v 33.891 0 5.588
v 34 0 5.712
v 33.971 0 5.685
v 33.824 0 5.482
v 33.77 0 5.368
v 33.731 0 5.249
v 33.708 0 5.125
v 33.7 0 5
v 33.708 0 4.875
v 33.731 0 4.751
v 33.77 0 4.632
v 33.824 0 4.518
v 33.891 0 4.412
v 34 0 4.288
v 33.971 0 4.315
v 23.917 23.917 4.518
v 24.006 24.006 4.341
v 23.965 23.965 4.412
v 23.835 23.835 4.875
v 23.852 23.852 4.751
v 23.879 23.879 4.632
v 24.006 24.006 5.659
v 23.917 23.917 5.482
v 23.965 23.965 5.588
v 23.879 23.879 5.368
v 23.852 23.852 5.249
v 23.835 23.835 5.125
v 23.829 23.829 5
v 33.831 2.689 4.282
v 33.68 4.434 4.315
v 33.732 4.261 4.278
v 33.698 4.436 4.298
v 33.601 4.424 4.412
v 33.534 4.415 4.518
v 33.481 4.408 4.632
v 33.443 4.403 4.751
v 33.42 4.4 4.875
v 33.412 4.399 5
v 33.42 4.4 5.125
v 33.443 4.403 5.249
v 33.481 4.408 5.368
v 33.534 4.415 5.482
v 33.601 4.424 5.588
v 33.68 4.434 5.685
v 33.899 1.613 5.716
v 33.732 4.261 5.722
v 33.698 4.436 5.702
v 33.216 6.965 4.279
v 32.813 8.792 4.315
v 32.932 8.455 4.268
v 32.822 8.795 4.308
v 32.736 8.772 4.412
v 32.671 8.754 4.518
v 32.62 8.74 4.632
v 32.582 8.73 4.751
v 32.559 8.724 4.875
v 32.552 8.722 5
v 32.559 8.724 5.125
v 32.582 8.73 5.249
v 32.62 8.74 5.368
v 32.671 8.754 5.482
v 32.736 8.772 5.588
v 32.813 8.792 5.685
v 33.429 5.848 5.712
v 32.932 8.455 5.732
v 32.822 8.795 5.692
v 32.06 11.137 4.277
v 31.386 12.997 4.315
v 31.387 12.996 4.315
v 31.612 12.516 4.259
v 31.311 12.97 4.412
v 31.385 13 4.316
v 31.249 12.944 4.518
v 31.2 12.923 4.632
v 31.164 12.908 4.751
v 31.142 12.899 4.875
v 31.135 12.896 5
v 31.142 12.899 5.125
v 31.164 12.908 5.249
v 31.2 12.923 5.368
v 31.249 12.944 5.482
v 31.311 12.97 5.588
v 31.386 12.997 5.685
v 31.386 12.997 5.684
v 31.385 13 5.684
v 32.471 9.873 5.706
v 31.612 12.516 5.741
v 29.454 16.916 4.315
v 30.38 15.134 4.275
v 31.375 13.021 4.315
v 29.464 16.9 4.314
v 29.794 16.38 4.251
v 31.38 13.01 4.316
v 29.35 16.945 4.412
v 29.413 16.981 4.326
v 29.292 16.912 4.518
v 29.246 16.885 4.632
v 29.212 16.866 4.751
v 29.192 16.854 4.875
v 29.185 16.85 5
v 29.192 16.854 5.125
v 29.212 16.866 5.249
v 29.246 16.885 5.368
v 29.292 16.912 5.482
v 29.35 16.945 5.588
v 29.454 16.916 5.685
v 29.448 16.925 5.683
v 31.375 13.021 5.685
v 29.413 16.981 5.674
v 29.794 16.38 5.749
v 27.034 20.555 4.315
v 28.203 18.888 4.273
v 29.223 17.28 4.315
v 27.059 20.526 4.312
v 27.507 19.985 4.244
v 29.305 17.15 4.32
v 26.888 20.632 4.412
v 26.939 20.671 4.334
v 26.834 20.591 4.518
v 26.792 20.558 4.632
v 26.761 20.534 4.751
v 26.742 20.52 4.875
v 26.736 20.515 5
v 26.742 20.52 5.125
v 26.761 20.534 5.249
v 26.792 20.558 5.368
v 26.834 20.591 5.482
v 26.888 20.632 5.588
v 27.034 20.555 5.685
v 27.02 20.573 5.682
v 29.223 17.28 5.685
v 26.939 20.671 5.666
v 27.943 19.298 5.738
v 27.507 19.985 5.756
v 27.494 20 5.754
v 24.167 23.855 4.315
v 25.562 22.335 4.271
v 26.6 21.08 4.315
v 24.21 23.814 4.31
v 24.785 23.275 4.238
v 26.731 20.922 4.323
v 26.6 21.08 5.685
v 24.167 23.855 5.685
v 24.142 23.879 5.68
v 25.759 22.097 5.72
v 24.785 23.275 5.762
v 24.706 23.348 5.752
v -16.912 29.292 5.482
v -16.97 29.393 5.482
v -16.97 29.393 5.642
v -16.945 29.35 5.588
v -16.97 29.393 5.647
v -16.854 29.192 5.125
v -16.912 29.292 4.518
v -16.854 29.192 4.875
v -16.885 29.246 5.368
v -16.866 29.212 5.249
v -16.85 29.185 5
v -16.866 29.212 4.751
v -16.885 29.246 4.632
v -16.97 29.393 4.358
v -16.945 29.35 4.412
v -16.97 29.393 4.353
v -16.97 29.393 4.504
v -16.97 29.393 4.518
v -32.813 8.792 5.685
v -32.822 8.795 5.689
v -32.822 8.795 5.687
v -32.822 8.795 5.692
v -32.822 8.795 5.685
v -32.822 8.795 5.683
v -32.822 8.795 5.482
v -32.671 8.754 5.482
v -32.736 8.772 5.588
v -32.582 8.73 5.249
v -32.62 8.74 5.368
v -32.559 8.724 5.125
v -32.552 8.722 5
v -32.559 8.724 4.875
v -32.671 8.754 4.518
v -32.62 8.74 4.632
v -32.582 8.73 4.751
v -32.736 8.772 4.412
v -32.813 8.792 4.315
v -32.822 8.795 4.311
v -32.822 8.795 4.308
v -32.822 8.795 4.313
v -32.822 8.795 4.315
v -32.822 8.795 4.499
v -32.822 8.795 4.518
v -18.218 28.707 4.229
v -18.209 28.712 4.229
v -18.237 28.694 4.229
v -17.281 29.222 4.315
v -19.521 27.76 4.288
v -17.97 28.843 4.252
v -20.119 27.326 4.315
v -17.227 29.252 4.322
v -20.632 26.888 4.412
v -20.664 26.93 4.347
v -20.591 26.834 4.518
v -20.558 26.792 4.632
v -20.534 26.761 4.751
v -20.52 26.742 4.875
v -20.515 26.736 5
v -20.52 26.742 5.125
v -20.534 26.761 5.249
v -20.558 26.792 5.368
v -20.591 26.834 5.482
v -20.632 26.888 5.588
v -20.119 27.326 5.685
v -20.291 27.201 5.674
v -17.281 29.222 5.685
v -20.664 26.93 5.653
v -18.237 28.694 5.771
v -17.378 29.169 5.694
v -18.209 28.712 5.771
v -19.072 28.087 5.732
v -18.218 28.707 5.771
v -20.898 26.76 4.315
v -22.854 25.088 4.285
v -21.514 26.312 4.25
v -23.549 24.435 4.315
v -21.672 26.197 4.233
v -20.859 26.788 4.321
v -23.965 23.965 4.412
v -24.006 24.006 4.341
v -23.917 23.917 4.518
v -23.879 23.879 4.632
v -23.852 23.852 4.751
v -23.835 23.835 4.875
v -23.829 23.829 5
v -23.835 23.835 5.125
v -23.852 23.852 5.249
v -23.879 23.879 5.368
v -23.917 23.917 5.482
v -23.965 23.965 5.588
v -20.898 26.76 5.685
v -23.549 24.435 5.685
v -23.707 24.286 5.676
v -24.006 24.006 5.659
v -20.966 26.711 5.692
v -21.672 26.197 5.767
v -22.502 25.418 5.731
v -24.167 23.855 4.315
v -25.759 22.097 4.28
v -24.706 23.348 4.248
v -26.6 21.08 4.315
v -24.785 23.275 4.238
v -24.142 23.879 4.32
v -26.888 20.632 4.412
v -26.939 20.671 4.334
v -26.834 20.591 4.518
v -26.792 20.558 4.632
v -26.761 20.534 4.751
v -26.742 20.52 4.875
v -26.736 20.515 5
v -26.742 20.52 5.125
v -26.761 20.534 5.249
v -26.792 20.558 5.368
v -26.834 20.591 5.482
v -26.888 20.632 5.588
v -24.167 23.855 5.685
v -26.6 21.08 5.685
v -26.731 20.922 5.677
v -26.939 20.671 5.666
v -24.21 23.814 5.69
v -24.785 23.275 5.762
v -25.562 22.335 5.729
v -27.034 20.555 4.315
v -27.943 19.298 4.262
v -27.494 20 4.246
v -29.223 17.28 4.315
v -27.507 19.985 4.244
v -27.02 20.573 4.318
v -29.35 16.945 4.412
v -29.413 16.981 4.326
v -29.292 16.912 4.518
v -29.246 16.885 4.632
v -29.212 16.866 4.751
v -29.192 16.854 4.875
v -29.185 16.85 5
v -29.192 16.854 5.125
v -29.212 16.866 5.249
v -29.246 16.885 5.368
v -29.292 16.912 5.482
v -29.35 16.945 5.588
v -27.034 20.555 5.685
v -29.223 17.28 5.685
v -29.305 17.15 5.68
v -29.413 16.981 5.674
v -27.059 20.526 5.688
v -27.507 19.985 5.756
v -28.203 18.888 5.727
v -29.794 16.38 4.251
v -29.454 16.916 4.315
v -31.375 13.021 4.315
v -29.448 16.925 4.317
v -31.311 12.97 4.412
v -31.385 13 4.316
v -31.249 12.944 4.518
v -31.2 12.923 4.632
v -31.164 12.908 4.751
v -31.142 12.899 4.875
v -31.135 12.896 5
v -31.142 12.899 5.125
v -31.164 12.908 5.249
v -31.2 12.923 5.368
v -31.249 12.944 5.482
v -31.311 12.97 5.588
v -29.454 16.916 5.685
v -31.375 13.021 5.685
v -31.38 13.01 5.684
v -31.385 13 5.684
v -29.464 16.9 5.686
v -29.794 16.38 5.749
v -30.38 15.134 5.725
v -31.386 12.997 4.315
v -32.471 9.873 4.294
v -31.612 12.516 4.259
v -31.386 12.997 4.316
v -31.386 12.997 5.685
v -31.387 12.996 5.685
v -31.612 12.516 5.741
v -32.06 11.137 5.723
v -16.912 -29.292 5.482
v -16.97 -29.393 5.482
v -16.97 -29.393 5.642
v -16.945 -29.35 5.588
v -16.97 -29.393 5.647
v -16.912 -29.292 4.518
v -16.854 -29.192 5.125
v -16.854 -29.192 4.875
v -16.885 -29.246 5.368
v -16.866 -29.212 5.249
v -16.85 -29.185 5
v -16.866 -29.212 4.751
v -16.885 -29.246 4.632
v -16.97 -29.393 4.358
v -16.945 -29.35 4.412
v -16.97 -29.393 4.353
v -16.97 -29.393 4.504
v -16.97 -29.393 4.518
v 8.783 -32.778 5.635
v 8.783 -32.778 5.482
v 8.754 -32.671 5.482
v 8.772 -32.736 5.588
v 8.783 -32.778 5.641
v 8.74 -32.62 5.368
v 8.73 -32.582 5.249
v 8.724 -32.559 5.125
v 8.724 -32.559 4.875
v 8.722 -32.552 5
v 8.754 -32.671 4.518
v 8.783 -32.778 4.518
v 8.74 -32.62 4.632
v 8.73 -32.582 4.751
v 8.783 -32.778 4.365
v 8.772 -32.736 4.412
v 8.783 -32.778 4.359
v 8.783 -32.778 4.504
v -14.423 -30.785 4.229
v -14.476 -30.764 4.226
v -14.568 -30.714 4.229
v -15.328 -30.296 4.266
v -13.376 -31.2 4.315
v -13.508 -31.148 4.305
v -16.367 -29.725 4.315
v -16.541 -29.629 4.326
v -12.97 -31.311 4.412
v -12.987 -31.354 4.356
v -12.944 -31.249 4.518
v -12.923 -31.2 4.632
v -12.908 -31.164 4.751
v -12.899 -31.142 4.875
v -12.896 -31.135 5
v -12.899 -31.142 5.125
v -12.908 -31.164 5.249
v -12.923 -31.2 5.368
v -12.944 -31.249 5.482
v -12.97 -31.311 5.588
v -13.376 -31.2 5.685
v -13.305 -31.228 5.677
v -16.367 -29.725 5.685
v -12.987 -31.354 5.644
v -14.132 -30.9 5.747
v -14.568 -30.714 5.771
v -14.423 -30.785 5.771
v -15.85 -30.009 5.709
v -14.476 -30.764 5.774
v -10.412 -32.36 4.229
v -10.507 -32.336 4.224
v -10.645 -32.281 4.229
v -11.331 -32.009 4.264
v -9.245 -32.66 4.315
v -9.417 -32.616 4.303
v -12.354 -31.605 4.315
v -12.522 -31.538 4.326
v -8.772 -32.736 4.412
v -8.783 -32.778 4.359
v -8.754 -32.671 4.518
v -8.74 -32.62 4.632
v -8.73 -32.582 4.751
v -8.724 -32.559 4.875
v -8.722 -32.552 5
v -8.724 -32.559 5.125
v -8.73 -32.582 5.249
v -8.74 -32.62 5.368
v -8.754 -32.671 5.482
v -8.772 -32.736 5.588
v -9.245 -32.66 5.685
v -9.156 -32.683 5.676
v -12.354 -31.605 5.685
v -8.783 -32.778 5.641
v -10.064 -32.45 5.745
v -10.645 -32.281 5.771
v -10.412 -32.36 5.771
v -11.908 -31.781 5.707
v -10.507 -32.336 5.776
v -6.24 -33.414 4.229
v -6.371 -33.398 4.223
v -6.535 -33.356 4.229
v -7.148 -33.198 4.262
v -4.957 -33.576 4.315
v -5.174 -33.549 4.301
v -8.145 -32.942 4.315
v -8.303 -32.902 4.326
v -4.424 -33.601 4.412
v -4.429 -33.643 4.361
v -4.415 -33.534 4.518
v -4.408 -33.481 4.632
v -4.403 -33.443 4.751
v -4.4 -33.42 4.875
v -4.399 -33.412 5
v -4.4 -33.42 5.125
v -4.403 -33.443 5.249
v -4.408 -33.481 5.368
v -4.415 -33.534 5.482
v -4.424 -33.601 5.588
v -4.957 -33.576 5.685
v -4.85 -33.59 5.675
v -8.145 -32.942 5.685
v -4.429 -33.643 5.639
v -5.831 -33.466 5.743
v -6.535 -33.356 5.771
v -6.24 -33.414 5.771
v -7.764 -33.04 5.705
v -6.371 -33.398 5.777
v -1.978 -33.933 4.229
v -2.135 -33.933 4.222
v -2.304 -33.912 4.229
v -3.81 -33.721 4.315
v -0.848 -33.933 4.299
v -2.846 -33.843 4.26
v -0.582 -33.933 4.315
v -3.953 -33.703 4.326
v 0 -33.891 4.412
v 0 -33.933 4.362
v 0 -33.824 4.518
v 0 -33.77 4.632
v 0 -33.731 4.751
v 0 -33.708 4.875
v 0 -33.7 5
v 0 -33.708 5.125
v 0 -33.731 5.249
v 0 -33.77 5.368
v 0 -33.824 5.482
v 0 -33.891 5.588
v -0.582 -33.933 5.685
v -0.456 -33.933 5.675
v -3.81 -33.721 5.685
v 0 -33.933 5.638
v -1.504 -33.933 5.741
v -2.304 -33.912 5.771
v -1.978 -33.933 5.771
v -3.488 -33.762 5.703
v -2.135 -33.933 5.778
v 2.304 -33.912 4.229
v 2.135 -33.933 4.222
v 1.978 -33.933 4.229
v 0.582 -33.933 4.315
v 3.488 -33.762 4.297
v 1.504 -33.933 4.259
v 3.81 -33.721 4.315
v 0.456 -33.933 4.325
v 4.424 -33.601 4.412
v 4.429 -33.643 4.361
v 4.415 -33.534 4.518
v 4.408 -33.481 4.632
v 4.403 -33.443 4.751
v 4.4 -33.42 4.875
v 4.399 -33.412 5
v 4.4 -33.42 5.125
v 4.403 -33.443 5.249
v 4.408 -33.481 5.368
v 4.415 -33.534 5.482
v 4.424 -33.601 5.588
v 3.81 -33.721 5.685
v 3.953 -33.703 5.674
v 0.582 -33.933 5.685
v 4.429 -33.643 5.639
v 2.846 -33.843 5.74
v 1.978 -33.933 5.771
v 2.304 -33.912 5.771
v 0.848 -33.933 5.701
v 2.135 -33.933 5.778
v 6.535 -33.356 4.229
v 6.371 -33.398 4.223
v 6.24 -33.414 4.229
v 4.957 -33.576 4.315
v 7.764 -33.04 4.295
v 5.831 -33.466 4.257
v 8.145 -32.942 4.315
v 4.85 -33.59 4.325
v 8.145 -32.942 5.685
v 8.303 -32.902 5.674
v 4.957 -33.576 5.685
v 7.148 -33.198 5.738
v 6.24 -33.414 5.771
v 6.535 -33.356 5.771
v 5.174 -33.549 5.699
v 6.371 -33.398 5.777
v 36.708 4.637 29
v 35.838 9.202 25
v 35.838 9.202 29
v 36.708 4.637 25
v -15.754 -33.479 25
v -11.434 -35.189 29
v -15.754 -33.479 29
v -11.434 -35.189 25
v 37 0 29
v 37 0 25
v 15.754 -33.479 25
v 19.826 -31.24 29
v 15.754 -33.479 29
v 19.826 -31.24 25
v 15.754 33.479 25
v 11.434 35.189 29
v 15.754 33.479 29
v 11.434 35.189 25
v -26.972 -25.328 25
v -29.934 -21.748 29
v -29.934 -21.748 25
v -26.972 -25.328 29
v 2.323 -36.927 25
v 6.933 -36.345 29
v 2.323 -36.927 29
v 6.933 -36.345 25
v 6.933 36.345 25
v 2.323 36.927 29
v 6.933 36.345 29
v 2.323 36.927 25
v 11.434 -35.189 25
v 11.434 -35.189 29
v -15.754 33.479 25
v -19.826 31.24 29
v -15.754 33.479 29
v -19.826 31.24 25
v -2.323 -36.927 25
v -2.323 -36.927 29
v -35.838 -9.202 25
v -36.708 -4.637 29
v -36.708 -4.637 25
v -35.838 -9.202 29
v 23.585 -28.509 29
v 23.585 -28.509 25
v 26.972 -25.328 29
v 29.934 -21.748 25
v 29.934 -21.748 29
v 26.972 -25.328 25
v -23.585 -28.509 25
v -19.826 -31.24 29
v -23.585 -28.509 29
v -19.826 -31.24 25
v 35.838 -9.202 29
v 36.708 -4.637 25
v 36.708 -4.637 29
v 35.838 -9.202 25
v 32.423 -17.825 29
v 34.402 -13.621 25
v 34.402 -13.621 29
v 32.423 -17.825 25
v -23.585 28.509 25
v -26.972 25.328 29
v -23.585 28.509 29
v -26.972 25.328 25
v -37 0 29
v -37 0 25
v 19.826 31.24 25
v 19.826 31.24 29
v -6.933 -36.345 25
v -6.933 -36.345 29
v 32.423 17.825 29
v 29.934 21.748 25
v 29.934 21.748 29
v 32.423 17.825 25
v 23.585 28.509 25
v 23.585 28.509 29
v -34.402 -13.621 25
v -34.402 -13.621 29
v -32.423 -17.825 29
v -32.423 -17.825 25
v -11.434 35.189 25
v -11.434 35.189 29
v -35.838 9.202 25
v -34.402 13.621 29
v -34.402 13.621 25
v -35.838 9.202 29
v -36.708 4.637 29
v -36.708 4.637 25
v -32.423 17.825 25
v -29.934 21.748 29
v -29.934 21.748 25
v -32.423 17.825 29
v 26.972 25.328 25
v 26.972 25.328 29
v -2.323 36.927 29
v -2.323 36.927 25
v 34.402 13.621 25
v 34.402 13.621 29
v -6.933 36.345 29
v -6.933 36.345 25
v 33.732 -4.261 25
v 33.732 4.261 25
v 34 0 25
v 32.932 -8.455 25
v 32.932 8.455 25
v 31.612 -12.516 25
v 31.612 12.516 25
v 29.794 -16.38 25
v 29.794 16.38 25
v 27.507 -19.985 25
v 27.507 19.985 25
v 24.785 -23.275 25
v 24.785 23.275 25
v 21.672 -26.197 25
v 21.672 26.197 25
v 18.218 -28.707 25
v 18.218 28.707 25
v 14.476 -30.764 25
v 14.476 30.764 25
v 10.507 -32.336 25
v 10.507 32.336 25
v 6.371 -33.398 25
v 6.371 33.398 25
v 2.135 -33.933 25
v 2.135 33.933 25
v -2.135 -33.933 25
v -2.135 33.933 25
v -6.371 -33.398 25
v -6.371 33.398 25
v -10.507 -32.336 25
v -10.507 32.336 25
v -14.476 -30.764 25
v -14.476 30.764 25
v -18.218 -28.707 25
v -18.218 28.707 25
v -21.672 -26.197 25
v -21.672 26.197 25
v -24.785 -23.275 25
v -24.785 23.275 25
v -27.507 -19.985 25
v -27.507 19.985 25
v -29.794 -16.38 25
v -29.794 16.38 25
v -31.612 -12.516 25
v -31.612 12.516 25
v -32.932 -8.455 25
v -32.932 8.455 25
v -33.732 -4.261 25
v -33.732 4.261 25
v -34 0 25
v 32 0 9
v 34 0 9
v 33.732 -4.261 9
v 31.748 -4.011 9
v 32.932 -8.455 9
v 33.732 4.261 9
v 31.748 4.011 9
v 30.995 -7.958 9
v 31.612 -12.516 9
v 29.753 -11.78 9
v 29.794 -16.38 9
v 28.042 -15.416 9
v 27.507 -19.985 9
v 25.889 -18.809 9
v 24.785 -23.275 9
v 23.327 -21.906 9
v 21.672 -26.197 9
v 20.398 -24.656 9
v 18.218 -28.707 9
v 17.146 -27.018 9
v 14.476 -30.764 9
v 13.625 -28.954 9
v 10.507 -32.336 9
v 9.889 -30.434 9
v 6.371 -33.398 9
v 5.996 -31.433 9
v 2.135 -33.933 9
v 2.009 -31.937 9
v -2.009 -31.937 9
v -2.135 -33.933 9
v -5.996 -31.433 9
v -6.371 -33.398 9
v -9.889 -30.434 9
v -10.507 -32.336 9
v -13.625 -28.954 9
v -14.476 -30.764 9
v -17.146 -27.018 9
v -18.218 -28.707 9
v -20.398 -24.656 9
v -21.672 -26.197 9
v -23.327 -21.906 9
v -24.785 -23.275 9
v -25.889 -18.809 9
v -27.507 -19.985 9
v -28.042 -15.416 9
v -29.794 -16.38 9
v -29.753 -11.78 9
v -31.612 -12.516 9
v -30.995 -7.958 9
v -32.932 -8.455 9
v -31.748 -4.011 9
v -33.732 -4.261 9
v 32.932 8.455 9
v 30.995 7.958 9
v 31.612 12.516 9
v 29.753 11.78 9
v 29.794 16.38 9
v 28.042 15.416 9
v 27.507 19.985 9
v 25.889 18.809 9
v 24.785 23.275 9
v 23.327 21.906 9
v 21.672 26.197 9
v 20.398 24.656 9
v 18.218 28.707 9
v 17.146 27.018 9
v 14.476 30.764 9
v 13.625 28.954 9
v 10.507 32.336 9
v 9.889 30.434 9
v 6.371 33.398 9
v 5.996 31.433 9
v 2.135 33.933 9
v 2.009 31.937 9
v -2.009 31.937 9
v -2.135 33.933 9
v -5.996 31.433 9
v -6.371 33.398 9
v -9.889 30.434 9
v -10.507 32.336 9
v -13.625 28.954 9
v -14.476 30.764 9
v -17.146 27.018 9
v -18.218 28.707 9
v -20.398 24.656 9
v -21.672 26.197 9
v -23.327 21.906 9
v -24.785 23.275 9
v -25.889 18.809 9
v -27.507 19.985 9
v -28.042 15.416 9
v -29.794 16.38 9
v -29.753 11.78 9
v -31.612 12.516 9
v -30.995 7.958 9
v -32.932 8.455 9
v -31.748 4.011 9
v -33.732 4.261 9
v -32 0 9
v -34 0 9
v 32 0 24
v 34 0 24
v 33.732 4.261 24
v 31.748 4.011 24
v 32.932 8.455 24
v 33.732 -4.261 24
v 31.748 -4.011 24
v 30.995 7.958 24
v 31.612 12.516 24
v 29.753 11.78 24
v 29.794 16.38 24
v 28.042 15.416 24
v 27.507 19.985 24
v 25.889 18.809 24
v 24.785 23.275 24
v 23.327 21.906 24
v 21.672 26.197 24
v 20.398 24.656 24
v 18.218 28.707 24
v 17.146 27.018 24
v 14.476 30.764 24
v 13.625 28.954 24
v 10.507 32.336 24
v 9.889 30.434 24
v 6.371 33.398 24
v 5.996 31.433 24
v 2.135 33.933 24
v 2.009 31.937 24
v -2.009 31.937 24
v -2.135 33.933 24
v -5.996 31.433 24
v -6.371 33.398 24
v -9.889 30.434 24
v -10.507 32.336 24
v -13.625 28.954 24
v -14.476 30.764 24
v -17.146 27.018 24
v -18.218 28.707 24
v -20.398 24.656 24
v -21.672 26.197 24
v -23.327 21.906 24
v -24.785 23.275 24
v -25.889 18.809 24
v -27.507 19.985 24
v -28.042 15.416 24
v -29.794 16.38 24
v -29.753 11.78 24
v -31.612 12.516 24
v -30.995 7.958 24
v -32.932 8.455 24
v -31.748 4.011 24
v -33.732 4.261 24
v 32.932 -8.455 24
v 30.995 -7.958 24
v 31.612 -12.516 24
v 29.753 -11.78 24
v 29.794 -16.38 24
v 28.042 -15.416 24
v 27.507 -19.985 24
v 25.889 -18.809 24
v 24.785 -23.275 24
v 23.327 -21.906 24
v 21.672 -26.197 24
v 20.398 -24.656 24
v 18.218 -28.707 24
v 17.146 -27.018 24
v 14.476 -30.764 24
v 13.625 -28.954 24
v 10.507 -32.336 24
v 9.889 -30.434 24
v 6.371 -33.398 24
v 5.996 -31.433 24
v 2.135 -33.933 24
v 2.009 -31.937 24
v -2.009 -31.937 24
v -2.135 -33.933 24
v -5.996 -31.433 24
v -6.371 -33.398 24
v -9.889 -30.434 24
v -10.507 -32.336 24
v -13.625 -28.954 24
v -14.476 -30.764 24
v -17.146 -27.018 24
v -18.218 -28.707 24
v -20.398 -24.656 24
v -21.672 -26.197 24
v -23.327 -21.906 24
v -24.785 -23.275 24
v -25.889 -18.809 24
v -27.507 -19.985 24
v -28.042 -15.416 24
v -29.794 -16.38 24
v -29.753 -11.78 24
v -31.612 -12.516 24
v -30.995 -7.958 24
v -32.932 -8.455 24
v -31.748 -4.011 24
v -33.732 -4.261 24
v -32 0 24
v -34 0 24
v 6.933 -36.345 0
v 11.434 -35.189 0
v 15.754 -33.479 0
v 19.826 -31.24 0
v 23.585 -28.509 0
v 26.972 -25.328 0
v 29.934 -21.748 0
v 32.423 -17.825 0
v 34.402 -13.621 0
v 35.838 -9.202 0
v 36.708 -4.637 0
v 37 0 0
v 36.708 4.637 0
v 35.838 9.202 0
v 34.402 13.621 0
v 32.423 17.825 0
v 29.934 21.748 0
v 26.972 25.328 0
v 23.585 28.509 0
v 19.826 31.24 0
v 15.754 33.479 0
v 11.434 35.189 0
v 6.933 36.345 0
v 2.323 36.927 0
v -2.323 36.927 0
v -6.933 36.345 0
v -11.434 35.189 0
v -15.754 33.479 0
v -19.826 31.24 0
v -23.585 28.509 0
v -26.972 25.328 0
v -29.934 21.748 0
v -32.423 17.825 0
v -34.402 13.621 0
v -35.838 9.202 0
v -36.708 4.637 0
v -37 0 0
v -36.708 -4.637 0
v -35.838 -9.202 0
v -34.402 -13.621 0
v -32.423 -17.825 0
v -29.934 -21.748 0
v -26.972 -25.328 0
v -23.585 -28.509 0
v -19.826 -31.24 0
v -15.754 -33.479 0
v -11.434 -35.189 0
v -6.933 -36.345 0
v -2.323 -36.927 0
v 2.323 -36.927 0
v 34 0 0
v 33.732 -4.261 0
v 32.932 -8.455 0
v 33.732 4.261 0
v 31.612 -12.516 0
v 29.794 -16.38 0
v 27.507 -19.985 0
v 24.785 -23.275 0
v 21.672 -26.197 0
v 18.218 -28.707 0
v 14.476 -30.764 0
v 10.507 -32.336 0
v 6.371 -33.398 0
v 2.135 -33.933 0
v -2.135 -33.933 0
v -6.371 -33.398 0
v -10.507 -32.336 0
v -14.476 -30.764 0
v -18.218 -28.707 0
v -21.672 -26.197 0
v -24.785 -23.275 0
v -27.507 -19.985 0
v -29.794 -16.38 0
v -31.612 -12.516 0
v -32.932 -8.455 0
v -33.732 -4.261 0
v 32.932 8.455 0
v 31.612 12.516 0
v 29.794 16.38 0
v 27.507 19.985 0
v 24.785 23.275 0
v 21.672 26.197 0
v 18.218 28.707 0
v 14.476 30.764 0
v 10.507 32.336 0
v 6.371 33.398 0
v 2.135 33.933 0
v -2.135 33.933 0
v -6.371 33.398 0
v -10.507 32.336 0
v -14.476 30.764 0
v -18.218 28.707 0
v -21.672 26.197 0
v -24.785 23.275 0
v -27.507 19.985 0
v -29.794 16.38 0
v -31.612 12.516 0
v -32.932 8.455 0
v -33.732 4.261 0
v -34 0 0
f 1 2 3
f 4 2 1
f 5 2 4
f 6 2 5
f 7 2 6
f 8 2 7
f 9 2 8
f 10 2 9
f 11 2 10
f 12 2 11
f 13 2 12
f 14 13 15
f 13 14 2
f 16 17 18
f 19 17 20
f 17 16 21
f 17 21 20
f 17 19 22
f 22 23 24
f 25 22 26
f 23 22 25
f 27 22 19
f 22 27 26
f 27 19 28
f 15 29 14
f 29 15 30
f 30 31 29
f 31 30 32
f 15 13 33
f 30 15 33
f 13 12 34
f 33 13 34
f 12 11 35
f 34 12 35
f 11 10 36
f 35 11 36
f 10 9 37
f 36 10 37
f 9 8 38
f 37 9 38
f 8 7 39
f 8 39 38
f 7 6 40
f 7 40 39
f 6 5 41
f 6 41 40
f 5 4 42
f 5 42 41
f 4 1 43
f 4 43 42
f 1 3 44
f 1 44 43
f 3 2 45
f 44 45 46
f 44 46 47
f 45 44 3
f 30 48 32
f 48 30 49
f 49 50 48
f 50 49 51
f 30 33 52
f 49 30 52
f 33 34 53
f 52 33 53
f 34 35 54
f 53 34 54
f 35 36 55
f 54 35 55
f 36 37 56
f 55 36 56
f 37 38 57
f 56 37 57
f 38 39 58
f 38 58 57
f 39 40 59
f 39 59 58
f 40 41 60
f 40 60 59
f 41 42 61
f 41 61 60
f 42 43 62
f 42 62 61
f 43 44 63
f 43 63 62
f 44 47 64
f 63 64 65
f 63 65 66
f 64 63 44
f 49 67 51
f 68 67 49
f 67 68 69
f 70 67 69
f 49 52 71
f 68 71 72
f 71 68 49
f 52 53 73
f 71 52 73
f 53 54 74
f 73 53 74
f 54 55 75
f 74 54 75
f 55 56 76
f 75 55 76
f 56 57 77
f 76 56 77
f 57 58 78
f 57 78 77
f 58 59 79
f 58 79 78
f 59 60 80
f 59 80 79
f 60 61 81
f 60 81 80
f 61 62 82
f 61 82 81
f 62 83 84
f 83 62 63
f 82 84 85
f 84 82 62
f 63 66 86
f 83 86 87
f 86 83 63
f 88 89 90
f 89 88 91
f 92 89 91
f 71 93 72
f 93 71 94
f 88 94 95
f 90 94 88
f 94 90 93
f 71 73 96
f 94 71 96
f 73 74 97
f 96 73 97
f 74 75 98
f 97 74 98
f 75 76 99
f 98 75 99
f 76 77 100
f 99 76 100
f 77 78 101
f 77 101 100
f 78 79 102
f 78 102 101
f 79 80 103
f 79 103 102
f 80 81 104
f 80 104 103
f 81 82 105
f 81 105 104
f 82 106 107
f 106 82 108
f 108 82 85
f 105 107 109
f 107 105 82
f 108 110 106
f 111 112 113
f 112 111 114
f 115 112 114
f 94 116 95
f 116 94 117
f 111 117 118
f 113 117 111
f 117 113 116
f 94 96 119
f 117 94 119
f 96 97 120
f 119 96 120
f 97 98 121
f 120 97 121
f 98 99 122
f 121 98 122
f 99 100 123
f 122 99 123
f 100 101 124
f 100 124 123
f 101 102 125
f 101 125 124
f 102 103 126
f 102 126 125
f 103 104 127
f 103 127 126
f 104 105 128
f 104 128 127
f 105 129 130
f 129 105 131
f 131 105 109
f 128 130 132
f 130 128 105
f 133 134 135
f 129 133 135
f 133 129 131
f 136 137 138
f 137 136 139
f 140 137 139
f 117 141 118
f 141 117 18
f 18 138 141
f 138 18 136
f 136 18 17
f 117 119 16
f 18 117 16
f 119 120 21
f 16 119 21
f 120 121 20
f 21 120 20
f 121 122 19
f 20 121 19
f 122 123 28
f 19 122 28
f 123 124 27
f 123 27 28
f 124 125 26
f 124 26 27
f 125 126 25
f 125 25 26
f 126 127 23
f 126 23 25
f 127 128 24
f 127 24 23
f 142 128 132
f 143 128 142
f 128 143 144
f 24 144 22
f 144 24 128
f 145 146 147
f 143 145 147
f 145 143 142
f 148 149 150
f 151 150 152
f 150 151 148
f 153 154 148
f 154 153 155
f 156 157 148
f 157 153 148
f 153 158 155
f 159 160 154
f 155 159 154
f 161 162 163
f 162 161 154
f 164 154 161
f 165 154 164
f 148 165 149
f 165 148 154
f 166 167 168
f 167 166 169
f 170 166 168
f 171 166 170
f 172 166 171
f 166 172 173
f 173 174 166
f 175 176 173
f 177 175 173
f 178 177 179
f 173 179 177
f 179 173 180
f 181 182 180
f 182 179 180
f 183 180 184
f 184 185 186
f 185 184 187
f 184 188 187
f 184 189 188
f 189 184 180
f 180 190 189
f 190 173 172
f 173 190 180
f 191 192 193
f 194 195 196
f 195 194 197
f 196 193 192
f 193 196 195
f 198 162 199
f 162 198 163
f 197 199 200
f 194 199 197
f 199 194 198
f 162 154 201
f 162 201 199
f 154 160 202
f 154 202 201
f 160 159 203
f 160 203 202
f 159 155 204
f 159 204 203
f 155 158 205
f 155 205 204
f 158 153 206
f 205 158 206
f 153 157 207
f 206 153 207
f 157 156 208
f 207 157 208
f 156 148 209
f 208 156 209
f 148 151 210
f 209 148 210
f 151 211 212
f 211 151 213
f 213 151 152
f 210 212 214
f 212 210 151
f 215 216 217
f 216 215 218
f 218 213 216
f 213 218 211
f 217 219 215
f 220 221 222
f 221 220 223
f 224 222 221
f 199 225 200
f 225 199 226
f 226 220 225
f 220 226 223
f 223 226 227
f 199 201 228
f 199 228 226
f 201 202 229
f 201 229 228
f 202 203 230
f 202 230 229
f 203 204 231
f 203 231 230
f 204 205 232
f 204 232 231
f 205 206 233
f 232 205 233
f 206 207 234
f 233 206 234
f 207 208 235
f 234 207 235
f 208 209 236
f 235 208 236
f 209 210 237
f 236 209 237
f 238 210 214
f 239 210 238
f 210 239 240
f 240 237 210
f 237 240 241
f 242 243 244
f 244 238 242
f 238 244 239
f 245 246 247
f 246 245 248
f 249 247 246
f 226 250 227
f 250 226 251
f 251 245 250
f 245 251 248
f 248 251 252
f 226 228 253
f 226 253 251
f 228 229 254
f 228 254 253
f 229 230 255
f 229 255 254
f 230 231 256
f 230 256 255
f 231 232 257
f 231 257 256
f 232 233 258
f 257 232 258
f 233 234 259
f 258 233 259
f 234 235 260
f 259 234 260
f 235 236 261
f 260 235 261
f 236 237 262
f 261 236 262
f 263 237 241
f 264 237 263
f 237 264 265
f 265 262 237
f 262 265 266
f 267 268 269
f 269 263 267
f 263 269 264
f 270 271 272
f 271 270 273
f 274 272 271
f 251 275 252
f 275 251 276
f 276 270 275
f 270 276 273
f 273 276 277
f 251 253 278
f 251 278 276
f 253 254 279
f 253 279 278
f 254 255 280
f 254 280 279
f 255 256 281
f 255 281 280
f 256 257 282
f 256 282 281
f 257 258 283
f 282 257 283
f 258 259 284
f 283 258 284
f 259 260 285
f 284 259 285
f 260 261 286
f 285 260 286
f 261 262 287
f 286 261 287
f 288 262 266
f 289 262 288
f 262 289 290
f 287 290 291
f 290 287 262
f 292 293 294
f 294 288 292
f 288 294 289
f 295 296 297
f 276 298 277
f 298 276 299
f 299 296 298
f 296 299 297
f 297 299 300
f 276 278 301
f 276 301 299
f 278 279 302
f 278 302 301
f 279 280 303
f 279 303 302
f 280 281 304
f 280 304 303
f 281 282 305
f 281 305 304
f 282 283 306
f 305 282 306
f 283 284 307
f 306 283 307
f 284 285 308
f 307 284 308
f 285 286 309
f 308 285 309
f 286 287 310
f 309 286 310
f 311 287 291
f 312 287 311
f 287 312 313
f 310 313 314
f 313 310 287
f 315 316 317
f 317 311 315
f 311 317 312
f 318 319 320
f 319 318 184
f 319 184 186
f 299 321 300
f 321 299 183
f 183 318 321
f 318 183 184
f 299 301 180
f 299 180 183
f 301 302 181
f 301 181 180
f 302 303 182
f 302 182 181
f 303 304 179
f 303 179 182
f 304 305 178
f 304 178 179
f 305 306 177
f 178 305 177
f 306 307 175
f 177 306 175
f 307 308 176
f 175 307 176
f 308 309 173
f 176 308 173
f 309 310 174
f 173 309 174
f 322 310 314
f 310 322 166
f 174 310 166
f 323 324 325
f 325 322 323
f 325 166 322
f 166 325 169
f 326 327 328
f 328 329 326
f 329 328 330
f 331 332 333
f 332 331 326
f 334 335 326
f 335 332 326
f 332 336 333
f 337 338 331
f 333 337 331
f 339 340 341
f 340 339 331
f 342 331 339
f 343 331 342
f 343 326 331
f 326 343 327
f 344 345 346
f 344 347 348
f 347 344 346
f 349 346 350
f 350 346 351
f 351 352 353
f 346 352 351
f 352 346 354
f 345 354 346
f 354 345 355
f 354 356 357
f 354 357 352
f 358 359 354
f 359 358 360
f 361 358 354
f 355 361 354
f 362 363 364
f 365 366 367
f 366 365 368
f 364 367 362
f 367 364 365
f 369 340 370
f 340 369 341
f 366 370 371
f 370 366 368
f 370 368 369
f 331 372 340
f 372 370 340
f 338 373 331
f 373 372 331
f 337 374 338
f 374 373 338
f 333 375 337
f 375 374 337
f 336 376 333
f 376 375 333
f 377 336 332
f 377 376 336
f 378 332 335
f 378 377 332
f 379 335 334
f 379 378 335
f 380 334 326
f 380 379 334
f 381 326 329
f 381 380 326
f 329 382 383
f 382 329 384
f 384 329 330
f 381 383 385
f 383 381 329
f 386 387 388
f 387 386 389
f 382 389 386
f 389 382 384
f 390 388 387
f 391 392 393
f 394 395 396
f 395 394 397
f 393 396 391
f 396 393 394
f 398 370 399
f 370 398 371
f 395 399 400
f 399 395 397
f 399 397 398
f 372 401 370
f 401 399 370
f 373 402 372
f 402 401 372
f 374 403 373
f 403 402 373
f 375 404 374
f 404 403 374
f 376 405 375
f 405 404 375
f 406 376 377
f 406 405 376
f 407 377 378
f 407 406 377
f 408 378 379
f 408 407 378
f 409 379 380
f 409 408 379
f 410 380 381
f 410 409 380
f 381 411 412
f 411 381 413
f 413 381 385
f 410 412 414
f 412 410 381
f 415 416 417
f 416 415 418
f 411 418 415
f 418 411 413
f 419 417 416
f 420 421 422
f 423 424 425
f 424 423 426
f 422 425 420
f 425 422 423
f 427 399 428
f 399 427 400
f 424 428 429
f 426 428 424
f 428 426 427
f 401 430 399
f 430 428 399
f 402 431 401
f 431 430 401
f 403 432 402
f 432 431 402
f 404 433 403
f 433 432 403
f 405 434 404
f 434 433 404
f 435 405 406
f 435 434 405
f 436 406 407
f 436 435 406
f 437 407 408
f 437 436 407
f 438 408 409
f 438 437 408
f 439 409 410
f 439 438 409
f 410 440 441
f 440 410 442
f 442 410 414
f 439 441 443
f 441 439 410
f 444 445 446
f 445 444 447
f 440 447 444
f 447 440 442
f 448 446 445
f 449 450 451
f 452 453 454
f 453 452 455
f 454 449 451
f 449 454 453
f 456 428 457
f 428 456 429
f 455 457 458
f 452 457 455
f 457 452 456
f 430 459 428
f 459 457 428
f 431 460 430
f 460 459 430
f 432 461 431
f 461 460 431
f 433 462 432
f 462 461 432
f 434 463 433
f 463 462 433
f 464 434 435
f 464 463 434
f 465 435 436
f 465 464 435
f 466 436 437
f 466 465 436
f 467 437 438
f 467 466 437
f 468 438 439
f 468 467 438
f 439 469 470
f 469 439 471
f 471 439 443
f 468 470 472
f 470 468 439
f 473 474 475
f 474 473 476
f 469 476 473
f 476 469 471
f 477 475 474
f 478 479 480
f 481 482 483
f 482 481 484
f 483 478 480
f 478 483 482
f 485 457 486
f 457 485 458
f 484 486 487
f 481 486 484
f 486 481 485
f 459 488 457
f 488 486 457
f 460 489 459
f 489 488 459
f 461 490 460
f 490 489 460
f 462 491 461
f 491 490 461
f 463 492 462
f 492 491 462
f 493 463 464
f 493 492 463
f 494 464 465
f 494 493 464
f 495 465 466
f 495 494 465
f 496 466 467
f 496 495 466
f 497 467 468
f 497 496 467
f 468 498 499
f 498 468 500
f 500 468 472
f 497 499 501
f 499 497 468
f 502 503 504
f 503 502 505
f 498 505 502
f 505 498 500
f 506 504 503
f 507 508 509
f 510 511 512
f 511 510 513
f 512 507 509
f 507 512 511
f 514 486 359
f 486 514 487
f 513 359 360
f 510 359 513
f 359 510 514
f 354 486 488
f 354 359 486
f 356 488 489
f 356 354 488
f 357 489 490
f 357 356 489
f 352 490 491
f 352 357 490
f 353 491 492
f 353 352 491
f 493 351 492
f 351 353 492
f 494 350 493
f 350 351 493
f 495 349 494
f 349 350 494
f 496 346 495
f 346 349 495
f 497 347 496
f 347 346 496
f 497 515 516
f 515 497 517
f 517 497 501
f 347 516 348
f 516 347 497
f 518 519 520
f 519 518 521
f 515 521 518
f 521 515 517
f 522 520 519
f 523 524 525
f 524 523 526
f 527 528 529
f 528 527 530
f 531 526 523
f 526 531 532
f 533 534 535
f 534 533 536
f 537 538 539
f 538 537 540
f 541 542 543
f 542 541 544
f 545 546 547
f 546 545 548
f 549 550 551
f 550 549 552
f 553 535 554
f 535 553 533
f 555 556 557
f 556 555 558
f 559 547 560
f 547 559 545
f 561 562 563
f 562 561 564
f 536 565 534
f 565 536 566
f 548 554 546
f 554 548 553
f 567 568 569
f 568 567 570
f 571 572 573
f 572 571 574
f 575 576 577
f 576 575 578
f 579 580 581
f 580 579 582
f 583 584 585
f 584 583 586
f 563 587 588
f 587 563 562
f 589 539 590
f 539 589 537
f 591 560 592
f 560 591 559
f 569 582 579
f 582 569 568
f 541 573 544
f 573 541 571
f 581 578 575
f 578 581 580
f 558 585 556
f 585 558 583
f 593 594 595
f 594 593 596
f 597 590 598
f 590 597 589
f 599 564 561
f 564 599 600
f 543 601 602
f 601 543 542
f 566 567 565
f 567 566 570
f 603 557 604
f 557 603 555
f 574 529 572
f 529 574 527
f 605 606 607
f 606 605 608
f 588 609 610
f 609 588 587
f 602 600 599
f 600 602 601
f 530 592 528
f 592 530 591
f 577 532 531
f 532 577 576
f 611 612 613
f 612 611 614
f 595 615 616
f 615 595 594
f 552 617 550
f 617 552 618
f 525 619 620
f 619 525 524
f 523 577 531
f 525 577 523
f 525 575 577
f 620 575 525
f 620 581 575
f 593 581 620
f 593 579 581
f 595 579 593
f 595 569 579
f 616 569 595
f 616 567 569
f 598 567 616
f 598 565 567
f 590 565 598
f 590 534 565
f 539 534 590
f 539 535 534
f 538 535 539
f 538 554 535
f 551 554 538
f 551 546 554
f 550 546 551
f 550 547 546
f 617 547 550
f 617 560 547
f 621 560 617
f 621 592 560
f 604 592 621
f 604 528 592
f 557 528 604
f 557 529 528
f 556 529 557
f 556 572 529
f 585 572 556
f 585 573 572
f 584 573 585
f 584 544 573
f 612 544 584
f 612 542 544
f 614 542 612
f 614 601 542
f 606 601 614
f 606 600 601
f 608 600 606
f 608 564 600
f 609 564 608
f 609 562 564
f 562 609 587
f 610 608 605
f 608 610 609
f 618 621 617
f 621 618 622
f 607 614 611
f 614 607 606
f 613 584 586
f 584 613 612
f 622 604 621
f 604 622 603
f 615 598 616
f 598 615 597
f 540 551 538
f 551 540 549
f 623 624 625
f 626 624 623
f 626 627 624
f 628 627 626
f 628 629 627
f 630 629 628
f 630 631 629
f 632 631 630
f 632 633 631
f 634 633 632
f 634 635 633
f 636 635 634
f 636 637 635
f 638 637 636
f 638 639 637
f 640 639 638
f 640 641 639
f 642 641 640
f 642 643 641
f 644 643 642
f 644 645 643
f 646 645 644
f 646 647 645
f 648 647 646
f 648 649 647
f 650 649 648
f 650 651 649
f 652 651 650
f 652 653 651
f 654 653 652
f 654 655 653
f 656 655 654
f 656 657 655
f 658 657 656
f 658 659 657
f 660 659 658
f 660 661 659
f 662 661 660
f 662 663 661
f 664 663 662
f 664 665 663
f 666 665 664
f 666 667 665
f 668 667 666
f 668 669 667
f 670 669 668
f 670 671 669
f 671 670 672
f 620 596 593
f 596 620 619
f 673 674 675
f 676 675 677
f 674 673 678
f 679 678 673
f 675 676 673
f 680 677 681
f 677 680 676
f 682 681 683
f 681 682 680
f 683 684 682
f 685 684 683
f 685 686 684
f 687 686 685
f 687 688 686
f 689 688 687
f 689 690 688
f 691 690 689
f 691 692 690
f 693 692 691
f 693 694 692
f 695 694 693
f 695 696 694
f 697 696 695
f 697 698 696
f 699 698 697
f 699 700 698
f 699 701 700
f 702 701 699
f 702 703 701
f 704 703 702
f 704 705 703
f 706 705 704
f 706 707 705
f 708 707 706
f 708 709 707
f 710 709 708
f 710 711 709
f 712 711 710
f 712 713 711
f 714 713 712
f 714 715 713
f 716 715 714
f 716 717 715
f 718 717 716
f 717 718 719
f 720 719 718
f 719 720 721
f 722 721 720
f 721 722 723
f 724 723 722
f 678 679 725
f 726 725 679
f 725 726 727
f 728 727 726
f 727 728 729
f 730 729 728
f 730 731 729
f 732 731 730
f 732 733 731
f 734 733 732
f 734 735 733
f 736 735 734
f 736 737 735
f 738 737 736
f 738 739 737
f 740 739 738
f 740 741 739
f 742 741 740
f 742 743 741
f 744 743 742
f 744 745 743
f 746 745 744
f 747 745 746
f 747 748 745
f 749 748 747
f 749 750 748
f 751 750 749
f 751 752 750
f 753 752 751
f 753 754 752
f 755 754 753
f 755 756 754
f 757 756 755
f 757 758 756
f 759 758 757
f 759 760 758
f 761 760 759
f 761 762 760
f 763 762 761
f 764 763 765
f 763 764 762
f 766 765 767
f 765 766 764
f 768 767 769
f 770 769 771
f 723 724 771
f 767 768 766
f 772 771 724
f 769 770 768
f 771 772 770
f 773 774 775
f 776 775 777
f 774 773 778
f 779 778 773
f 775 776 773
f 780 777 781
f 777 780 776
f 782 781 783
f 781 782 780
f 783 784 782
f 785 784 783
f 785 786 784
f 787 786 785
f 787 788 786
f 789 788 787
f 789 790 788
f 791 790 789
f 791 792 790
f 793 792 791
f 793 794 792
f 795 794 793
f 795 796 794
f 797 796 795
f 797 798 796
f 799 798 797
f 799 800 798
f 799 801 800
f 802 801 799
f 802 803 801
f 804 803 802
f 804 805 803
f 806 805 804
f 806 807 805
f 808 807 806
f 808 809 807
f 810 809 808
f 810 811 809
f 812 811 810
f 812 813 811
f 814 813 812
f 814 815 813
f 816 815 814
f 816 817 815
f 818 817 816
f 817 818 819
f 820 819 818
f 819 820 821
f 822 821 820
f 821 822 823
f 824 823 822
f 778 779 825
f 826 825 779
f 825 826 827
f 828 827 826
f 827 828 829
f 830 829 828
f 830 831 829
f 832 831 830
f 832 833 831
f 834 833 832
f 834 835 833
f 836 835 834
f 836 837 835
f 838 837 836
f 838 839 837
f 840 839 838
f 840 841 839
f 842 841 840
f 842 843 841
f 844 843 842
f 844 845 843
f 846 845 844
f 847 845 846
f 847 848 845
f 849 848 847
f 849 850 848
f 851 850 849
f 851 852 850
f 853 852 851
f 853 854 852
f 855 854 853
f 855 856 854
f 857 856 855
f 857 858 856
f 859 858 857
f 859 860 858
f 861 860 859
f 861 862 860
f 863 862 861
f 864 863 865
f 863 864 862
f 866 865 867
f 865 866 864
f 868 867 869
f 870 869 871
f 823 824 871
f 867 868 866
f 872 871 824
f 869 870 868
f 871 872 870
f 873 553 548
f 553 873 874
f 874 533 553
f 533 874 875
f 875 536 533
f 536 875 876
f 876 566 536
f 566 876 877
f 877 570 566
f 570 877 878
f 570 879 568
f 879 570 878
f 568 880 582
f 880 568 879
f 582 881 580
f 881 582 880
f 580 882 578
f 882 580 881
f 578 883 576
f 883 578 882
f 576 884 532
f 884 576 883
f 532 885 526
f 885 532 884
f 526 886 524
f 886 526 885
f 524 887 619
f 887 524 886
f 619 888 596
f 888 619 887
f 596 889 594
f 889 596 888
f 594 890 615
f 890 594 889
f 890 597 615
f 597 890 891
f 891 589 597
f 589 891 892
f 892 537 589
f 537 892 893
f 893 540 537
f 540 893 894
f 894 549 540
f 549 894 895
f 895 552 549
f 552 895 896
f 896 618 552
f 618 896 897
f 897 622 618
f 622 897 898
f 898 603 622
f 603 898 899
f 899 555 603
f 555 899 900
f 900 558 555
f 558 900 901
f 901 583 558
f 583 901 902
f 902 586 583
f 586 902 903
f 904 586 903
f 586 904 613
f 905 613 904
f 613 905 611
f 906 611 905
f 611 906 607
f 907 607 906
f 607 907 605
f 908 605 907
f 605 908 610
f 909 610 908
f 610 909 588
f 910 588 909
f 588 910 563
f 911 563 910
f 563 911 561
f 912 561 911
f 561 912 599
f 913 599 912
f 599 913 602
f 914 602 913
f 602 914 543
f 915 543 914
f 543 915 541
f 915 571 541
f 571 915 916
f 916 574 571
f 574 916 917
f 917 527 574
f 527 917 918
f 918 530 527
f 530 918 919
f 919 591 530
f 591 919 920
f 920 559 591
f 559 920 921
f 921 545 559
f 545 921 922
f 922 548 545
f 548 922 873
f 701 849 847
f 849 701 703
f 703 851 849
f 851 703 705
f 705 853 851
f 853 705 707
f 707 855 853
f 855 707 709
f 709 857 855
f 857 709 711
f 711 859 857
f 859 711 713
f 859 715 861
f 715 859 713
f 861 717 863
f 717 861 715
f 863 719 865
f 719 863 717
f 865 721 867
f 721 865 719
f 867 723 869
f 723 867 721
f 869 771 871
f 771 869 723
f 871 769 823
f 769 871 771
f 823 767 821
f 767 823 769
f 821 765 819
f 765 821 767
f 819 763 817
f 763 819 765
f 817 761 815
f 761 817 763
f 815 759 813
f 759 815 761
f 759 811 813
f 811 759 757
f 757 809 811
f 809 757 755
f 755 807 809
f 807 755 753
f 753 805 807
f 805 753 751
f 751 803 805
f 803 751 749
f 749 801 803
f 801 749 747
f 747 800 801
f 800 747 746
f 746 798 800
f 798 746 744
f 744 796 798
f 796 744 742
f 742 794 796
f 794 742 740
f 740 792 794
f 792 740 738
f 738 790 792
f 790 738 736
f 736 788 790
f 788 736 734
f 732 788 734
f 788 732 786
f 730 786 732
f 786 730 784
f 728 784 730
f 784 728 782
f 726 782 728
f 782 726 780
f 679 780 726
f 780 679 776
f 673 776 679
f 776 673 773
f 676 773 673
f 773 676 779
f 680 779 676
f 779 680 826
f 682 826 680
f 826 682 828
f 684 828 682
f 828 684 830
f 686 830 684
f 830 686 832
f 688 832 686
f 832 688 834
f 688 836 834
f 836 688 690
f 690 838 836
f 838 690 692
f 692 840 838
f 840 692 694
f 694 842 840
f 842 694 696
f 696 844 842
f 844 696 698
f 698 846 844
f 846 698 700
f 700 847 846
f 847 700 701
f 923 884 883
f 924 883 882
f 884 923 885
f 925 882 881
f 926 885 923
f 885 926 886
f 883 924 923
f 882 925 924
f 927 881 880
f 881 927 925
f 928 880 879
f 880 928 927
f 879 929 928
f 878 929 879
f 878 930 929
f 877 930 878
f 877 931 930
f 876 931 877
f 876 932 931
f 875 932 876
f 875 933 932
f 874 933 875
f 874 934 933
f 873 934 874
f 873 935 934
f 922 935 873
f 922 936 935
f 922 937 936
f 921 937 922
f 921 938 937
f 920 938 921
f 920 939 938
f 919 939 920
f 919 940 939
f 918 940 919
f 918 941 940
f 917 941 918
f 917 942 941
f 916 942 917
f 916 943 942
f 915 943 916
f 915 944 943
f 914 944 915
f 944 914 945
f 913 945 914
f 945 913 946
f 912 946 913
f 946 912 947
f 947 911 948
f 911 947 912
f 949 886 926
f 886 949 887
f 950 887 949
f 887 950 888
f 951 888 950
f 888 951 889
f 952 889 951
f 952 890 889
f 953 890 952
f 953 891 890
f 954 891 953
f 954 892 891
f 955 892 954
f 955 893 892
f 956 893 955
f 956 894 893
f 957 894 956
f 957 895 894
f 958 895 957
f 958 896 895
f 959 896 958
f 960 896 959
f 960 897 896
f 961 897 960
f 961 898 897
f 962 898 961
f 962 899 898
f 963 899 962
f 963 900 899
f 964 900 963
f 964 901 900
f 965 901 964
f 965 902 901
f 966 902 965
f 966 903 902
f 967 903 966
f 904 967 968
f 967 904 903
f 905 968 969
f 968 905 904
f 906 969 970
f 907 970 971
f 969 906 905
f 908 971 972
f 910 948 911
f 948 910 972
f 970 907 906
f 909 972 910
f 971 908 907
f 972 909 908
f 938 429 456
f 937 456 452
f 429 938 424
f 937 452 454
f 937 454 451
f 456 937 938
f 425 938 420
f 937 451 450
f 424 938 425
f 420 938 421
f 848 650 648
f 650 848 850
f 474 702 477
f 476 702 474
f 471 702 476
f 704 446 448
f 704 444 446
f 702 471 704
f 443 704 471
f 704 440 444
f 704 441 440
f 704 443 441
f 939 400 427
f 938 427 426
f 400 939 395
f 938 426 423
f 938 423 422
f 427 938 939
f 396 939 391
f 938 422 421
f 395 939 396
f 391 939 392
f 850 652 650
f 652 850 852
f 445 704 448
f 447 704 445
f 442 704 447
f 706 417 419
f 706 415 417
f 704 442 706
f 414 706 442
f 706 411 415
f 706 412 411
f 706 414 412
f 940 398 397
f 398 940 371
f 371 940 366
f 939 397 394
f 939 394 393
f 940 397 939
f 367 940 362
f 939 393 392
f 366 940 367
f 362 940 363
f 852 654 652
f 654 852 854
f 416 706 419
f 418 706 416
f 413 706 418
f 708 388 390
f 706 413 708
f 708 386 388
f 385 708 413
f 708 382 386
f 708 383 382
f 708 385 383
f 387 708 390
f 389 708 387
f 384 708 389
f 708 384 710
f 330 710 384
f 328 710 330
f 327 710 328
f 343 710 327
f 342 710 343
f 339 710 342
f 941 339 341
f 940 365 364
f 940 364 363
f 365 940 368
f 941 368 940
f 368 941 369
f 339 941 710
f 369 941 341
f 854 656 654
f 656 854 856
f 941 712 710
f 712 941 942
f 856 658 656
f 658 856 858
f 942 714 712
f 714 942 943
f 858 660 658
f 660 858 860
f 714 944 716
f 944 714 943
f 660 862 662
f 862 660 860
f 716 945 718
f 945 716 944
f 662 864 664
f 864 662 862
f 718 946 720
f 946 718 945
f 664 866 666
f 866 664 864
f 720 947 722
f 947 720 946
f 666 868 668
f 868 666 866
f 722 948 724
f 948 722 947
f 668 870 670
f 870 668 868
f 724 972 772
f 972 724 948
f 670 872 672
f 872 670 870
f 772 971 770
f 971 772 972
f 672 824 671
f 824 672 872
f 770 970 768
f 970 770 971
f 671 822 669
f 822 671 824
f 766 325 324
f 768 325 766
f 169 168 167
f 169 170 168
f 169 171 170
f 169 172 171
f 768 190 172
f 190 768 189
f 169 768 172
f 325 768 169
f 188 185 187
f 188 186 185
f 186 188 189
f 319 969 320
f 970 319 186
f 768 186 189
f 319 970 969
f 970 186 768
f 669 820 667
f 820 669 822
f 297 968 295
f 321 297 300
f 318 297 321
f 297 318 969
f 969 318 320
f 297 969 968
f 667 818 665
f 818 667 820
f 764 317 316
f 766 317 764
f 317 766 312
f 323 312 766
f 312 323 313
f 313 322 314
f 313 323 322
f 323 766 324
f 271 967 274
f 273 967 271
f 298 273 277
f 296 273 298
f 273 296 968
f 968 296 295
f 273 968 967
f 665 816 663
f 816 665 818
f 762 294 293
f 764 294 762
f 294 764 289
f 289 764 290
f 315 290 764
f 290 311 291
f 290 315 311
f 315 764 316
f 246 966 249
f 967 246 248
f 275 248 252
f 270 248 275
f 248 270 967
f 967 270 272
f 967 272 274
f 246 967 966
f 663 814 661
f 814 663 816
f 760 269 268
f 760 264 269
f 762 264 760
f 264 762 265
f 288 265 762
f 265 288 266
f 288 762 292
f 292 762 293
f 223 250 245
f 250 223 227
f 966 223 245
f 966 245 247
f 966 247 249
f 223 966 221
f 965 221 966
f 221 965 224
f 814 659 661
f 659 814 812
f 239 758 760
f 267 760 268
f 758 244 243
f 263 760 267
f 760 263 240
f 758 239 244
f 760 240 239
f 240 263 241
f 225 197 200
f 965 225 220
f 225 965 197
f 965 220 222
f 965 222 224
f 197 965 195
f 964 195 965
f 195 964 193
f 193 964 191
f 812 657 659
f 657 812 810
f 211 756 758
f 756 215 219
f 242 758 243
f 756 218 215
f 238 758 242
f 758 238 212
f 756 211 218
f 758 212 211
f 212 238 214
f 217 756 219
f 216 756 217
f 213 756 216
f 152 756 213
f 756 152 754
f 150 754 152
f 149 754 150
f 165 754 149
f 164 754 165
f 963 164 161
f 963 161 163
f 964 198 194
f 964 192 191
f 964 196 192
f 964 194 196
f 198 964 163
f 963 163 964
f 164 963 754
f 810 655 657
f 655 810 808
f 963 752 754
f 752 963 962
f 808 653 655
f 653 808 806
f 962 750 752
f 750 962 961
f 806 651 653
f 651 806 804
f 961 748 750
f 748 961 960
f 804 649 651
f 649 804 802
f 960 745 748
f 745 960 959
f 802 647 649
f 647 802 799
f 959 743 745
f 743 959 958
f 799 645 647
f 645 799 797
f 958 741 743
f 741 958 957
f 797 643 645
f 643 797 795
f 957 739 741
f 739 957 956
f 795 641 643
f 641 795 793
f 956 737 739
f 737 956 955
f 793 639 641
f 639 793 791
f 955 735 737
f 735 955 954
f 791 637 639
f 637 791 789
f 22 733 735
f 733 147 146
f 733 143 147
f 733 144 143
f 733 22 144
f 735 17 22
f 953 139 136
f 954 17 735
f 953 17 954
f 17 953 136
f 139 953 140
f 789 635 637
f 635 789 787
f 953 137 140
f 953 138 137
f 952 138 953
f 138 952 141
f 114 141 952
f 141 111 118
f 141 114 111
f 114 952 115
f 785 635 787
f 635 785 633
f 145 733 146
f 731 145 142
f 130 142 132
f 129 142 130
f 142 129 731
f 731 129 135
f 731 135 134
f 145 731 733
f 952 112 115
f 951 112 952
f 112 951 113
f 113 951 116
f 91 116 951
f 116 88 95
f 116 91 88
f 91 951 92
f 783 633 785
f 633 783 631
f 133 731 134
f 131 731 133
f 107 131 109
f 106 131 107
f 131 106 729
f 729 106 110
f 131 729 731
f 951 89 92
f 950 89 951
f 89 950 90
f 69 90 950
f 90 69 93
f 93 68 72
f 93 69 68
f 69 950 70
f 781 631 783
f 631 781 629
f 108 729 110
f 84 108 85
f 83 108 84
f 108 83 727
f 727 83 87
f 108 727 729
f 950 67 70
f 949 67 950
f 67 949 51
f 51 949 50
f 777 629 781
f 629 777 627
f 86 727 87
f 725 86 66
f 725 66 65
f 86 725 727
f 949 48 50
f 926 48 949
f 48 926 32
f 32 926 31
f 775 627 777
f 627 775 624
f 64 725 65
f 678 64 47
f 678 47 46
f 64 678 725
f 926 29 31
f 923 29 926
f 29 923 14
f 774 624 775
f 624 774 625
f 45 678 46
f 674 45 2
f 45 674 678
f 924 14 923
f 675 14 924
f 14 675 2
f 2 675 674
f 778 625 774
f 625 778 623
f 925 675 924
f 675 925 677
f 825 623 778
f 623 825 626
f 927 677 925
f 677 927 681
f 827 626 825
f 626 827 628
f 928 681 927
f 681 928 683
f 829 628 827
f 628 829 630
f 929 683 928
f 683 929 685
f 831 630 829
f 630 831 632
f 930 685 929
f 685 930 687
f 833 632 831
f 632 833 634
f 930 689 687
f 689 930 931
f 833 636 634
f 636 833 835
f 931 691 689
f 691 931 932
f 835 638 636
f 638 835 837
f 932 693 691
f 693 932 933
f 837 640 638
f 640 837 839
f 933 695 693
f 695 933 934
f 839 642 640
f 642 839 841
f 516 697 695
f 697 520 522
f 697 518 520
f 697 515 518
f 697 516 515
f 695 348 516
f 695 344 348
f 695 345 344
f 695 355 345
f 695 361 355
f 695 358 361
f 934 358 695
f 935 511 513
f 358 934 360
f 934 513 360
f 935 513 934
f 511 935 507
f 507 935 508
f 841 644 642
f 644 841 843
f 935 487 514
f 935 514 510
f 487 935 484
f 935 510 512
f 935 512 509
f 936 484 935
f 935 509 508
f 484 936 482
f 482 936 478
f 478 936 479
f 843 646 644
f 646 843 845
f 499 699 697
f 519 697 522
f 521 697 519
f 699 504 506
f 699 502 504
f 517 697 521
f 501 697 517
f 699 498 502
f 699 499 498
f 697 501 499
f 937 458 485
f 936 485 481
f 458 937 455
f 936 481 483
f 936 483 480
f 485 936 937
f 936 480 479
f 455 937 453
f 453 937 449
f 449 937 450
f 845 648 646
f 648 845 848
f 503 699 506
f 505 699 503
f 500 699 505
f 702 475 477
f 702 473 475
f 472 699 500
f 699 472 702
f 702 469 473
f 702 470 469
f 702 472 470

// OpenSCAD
$fn=50;

cap();

module cap() {
    union() {
        translate([0, 0, 25]) linear_extrude(4) circle(37);
        translate([0, 0, 9]) linear_extrude(15) difference() {
            circle(37);
            circle(32);
        }
        linear_extrude(25) difference() {
            circle(37);
            circle(34);
        }
        for(z = [0 : 1 : 2]) {
            rotate([0, 0, 120*z]) translate([0, 0, 5]) rotate_extrude(angle = 45, convexity = 2) translate([34.7, 0, 0]) circle(1);
        }
    }

}
